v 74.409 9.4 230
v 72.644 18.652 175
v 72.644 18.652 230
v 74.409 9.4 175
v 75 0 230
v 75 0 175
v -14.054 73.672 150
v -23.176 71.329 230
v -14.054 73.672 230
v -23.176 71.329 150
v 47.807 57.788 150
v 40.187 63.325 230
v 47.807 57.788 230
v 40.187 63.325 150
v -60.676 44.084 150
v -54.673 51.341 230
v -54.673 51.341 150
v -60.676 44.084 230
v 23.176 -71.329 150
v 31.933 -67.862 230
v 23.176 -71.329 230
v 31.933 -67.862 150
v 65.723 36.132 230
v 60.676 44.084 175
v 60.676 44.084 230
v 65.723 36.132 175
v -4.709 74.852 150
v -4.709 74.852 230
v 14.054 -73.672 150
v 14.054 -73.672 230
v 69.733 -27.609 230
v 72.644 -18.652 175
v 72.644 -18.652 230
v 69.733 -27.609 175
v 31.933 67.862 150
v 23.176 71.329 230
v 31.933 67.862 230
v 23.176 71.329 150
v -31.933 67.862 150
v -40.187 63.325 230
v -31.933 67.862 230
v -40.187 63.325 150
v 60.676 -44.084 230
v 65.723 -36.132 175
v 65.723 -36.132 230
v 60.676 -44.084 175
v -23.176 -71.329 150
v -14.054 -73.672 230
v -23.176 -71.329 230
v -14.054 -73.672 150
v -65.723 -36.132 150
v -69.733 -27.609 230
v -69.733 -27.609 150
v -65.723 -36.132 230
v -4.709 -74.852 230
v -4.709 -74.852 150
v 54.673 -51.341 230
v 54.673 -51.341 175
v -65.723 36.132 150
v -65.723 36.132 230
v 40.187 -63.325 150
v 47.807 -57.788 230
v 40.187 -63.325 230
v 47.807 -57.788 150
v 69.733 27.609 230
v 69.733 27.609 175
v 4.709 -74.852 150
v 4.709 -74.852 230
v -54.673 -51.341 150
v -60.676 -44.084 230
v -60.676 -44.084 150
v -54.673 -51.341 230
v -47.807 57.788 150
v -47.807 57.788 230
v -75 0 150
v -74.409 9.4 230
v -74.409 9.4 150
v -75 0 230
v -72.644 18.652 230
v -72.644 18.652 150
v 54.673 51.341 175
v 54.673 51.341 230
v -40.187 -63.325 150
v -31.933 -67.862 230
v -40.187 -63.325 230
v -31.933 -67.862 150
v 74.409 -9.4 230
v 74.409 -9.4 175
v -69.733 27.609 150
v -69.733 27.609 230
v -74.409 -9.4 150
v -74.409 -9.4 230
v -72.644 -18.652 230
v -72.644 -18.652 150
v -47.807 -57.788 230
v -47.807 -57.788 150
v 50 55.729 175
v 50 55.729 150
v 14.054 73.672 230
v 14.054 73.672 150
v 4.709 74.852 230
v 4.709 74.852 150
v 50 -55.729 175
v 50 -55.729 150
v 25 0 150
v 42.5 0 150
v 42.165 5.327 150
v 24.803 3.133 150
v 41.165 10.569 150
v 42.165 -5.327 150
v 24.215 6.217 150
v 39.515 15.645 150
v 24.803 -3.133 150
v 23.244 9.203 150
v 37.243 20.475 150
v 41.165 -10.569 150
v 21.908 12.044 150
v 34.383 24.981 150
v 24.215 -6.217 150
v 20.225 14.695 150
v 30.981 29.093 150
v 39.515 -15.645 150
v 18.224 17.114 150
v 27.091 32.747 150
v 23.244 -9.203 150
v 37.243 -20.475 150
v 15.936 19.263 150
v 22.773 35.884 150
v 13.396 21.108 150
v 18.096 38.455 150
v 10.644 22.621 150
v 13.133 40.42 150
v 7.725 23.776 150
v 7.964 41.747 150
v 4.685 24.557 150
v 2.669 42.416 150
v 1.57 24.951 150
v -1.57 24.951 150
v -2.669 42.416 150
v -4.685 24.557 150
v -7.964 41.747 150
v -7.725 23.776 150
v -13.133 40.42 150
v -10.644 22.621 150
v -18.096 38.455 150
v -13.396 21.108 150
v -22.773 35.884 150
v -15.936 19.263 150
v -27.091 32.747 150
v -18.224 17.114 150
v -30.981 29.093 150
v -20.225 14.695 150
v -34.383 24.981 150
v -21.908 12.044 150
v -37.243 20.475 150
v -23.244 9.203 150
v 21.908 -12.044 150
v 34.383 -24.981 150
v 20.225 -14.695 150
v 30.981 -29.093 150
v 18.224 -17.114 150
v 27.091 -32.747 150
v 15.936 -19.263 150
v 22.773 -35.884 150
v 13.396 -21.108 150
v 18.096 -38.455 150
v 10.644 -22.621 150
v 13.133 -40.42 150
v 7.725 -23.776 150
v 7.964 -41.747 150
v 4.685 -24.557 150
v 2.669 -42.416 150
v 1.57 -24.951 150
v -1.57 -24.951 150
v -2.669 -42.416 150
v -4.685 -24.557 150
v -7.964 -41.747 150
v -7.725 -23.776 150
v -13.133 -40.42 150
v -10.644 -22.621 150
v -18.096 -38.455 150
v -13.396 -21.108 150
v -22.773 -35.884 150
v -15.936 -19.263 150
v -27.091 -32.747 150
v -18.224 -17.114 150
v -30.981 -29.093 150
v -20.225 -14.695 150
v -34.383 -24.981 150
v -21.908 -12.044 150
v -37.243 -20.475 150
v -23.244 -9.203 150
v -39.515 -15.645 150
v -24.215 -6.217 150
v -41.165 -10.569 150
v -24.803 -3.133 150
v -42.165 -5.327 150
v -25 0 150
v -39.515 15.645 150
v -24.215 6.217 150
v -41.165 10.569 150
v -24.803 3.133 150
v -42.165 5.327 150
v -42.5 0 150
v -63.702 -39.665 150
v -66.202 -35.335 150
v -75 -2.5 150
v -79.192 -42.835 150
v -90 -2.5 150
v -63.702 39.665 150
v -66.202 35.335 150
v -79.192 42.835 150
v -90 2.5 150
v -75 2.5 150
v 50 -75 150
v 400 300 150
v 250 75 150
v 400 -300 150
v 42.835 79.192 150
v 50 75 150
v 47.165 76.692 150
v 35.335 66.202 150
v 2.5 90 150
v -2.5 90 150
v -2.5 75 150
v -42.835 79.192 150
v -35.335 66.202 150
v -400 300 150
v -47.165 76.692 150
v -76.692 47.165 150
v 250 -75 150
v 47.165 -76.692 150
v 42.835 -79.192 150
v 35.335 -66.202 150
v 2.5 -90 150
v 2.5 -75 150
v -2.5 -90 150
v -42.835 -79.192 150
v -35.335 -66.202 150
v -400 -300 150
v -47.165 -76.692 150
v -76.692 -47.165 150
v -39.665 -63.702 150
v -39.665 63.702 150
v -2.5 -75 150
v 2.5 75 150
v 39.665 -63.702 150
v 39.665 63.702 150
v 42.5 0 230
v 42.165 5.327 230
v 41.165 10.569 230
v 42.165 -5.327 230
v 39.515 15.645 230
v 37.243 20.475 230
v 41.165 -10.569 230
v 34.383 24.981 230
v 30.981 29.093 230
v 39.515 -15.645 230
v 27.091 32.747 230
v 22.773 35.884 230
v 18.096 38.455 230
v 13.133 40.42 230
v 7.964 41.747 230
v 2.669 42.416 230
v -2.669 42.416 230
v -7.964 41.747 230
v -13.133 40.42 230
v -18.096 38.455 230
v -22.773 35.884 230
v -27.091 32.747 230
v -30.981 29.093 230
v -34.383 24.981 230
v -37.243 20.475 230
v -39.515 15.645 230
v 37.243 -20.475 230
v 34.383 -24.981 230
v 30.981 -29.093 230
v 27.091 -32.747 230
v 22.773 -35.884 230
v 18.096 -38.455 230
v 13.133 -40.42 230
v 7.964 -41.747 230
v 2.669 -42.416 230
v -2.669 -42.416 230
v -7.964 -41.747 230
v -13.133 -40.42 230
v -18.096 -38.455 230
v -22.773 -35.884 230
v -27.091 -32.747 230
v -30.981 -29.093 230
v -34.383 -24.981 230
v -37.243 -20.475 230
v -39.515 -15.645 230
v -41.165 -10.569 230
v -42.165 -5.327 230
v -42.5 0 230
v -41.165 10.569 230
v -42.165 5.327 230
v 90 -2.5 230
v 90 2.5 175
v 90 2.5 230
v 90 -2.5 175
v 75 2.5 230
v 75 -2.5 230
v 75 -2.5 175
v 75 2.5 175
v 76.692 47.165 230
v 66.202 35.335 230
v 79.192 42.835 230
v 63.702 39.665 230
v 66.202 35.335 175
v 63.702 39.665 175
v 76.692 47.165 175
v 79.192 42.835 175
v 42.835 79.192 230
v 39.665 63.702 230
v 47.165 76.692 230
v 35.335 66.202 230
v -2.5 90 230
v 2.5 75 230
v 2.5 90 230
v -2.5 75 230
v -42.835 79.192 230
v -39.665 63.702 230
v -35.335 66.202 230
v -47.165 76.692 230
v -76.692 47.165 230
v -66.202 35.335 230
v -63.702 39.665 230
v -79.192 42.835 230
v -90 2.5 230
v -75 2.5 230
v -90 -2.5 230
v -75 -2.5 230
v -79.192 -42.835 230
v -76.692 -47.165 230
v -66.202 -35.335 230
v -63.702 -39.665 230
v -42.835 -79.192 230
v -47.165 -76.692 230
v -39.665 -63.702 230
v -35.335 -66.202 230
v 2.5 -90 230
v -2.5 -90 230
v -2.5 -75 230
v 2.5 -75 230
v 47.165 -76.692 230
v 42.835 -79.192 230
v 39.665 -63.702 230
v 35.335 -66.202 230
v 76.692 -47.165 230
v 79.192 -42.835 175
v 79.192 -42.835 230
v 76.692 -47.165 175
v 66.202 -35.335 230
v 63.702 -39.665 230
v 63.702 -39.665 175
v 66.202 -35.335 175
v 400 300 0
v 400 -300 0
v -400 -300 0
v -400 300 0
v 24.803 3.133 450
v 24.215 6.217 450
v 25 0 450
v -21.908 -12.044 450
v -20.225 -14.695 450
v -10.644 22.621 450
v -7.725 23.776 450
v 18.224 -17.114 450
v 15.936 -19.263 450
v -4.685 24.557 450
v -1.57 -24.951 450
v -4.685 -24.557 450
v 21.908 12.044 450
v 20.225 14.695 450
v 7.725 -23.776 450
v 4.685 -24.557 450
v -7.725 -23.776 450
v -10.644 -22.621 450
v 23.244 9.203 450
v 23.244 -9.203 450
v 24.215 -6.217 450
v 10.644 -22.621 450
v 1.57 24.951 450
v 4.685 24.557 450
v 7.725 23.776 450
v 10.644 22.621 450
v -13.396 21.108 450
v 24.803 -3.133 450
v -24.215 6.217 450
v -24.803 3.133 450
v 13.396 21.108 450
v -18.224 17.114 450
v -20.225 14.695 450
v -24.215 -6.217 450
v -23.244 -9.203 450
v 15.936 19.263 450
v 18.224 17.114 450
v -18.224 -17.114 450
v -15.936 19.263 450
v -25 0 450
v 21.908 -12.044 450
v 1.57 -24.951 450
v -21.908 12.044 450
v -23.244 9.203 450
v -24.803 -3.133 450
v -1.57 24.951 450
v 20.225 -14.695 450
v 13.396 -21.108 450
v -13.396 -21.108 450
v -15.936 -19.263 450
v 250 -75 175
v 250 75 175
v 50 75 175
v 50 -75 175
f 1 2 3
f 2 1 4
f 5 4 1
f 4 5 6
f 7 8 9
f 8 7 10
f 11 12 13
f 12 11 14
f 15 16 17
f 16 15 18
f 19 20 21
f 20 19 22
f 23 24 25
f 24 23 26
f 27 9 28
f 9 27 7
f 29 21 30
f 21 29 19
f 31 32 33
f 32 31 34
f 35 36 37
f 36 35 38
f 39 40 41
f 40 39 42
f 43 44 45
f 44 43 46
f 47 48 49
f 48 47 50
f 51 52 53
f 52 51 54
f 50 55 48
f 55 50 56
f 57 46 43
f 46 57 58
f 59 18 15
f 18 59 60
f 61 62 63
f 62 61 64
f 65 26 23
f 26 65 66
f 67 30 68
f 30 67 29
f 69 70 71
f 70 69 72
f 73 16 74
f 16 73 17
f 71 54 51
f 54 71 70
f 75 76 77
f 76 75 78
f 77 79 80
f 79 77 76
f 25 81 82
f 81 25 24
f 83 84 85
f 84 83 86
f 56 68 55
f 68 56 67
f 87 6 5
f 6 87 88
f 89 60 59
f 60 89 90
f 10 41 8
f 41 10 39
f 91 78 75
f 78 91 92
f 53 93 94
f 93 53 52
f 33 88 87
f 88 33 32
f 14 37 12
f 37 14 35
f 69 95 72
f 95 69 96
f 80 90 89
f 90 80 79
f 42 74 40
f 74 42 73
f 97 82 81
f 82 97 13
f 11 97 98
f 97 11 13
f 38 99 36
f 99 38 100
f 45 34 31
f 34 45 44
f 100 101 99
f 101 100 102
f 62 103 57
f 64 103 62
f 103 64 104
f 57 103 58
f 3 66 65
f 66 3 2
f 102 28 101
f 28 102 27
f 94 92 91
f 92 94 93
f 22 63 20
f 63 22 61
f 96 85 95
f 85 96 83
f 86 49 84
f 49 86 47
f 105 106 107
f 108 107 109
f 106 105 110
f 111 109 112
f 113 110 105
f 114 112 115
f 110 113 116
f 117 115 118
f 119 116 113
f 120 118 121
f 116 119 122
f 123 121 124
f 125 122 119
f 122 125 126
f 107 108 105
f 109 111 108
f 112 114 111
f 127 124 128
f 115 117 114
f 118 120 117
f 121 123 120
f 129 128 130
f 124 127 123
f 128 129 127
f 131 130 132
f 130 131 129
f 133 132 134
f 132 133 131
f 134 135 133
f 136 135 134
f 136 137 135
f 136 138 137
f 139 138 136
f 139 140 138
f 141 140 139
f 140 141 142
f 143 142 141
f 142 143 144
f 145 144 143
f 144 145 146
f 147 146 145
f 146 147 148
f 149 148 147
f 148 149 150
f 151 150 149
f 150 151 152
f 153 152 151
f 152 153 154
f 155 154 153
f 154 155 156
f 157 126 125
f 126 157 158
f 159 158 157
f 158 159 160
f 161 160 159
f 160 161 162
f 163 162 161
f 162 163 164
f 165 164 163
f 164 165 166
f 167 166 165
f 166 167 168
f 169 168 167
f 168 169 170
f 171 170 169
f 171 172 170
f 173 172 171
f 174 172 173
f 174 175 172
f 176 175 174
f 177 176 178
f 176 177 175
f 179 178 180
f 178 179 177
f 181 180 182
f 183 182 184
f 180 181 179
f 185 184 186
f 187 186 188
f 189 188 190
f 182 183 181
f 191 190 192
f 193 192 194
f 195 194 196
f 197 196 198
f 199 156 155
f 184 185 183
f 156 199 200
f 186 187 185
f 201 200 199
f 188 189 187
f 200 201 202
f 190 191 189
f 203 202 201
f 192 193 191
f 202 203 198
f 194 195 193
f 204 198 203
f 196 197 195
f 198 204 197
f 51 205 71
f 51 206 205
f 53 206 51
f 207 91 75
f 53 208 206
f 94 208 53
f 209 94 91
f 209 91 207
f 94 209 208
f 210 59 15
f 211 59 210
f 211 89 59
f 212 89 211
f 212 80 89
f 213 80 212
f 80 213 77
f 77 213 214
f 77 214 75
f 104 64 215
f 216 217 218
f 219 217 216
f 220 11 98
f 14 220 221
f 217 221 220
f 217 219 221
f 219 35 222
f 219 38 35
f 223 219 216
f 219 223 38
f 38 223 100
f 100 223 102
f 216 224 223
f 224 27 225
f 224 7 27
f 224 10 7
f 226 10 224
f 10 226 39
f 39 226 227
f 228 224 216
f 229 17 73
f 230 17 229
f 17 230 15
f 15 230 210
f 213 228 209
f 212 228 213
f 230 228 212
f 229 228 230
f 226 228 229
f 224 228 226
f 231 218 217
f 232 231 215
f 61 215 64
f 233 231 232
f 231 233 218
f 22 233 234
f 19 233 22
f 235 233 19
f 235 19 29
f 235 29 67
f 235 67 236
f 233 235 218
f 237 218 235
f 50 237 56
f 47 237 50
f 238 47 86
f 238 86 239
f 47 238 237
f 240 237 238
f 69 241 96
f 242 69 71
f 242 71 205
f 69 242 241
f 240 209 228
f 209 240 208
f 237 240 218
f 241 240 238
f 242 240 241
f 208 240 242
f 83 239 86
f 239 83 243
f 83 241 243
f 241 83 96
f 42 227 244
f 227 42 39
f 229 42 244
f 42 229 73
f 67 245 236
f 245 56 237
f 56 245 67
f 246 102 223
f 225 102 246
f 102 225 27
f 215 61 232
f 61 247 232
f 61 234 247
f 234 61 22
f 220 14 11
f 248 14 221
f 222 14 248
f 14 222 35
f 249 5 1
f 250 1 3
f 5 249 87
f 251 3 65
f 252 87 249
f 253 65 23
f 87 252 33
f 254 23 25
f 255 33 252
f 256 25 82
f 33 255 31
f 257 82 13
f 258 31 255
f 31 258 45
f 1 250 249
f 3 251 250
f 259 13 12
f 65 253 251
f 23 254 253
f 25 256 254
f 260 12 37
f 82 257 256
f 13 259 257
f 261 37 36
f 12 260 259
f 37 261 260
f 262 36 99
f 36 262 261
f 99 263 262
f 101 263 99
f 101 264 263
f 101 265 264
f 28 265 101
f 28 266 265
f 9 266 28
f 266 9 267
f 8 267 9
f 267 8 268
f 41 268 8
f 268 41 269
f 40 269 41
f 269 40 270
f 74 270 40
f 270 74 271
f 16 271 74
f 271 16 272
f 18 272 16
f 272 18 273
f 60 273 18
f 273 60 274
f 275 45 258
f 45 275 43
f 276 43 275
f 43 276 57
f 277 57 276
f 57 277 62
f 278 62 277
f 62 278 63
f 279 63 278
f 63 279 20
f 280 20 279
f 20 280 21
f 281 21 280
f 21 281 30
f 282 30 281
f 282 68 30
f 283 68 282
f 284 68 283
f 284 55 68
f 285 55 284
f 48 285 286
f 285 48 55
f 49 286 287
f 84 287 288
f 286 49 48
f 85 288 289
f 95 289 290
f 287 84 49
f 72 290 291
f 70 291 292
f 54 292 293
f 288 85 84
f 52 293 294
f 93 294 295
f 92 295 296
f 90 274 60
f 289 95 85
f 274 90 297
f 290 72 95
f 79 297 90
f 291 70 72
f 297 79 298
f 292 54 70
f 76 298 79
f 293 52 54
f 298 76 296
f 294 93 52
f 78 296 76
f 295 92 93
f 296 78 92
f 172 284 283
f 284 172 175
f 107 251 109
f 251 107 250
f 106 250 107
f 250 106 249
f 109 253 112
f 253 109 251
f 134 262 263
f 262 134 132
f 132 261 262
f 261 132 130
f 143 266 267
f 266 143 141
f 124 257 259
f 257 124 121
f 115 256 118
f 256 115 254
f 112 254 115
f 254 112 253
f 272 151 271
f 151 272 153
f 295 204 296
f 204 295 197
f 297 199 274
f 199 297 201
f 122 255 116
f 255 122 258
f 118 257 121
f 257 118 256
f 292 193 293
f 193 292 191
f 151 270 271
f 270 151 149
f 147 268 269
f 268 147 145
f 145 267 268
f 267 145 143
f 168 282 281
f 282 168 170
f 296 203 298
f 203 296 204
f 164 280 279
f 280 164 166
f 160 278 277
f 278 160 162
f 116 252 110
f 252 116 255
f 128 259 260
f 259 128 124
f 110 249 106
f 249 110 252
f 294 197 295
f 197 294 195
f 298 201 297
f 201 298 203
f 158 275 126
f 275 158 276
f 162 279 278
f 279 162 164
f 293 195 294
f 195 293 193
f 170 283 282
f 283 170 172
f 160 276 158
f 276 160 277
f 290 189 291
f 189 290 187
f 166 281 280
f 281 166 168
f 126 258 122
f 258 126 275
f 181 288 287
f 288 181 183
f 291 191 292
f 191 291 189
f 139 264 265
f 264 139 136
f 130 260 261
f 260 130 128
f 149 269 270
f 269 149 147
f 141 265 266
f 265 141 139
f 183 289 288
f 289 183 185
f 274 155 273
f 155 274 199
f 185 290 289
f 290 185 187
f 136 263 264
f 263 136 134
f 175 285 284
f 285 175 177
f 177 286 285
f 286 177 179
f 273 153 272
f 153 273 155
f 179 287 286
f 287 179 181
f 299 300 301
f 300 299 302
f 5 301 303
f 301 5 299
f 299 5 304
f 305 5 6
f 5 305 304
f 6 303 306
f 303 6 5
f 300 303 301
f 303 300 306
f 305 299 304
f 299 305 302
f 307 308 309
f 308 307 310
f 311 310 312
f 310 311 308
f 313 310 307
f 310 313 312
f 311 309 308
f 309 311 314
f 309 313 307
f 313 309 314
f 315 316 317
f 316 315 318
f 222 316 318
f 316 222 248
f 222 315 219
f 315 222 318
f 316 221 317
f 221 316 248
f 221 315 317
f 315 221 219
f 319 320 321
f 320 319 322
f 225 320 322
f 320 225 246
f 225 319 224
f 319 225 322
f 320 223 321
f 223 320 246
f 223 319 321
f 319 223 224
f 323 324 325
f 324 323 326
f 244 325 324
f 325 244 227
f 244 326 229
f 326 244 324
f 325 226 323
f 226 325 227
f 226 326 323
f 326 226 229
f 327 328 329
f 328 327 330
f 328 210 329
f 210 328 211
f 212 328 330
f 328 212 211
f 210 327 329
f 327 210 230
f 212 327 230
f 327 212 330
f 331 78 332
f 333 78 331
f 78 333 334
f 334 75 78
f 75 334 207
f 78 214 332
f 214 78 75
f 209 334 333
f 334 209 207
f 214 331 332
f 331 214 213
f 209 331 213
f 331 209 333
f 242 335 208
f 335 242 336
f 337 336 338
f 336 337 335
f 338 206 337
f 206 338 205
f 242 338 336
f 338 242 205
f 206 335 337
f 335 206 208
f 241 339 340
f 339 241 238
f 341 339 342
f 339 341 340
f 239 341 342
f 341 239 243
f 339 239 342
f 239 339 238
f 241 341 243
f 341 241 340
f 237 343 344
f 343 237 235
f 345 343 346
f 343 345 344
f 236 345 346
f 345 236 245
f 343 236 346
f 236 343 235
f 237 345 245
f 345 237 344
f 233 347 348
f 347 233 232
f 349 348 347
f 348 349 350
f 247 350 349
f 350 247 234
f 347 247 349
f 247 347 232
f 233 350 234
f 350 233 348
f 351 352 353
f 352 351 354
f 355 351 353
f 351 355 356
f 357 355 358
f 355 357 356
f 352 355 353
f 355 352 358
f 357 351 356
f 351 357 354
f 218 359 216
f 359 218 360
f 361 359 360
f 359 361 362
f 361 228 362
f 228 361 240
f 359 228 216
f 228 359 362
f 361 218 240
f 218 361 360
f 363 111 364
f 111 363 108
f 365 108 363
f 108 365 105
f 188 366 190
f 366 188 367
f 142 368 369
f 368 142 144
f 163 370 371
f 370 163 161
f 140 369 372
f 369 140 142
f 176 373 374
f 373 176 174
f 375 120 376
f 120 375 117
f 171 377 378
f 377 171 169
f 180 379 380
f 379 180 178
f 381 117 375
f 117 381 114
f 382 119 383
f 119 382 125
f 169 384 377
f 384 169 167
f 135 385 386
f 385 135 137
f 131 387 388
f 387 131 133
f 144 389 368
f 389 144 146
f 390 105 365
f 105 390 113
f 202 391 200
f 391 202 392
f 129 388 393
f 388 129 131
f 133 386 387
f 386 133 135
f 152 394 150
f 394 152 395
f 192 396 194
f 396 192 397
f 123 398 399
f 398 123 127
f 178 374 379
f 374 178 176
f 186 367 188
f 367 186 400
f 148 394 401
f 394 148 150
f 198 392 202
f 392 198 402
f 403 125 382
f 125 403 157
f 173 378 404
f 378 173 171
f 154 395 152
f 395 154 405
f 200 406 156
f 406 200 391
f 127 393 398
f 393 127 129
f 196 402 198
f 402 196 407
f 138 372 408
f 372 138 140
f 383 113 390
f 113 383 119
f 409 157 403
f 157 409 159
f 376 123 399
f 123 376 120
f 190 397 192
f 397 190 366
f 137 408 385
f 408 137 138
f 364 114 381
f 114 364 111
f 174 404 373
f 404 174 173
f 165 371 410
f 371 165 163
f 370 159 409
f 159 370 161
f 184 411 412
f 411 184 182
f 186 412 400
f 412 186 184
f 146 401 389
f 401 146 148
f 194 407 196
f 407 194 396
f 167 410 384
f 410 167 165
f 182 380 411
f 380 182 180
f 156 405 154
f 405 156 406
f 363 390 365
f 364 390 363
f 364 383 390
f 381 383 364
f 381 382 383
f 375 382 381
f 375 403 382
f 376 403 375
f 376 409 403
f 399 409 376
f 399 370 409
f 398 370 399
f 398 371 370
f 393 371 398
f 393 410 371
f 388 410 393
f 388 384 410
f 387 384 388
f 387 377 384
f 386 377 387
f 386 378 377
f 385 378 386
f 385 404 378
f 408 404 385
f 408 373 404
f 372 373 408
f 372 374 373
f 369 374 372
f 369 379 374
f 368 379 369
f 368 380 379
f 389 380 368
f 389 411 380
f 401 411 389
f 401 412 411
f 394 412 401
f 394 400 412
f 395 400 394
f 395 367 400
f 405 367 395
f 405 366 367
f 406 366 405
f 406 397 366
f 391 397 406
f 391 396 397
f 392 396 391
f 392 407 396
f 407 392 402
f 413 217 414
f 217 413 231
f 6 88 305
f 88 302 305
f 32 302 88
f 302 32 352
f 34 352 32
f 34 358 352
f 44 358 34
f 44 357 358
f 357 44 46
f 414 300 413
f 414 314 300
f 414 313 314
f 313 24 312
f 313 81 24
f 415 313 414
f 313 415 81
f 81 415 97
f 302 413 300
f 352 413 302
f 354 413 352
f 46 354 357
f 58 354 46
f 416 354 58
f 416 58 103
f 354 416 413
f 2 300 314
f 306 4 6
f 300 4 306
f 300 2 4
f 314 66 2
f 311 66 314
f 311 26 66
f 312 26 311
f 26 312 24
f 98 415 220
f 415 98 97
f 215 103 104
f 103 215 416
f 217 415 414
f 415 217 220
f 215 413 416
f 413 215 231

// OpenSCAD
// OpenSCAD Model: ILM-E85x30 Motor Test Bed
// Generated from Assignment 1 parametric design
// Usage: Open in OpenSCAD and render

$fn = 50; // Smooth curves

// Design Parameters
base_length = 800.0;
base_width = 600.0;
base_height = 150.0;

housing_outer_dia = 150.0;
housing_length = 80.0;
housing_bore_dia = 85.0;

shaft_diameter = 50.0;
shaft_length = 400.0;

// Colors
color_base = [0.5, 0.5, 0.5];      // Gray (Cast Iron)
color_housing = [0.8, 0.8, 0.9];   // Light Blue (Aluminum)
color_shaft = [0.9, 0.9, 0.7];     // Light Yellow (Steel)
color_mount = [0.7, 0.7, 0.9];     // Light Purple

module base_frame() {
    color(color_base)
    translate([-base_length/2, -base_width/2, 0])
    cube([base_length, base_width, base_height]);
}

module motor_housing() {
    color(color_housing)
    translate([0, 0, base_height])
    difference() {
        cylinder(d=housing_outer_dia, h=housing_length);
        translate([0, 0, -1])
        cylinder(d=housing_bore_dia, h=housing_length+2);
    }
}

module main_shaft() {
    color(color_shaft)
    translate([0, 0, base_height - shaft_length/4])
    cylinder(d=shaft_diameter, h=shaft_length);
}

module sensor_mount() {
    color(color_mount)
    translate([50, -75, base_height])
    cube([200, 150, 25]);
}

module cooling_fins() {
    color(color_housing)
    translate([0, 0, base_height])
    for(i = [0:30:330]) {
        rotate([0, 0, i])
        translate([housing_outer_dia/2, -2.5, 0])
        cube([15, 5, housing_length]);
    }
}

// Assembly
module motor_test_bed() {
    base_frame();
    motor_housing();
    cooling_fins();
    main_shaft();
    sensor_mount();
}

// Generate the complete assembly
motor_test_bed();

// Add text labels
translate([0, -base_width/2 - 50, 0])
color([0, 0, 0])
text("ILM-E85x30 Motor Test Bed", size=20, halign="center");

translate([0, -base_width/2 - 80, 0])
color([0, 0, 0])
text("Assignment 1 - Parametric Design", size=12, halign="center");
